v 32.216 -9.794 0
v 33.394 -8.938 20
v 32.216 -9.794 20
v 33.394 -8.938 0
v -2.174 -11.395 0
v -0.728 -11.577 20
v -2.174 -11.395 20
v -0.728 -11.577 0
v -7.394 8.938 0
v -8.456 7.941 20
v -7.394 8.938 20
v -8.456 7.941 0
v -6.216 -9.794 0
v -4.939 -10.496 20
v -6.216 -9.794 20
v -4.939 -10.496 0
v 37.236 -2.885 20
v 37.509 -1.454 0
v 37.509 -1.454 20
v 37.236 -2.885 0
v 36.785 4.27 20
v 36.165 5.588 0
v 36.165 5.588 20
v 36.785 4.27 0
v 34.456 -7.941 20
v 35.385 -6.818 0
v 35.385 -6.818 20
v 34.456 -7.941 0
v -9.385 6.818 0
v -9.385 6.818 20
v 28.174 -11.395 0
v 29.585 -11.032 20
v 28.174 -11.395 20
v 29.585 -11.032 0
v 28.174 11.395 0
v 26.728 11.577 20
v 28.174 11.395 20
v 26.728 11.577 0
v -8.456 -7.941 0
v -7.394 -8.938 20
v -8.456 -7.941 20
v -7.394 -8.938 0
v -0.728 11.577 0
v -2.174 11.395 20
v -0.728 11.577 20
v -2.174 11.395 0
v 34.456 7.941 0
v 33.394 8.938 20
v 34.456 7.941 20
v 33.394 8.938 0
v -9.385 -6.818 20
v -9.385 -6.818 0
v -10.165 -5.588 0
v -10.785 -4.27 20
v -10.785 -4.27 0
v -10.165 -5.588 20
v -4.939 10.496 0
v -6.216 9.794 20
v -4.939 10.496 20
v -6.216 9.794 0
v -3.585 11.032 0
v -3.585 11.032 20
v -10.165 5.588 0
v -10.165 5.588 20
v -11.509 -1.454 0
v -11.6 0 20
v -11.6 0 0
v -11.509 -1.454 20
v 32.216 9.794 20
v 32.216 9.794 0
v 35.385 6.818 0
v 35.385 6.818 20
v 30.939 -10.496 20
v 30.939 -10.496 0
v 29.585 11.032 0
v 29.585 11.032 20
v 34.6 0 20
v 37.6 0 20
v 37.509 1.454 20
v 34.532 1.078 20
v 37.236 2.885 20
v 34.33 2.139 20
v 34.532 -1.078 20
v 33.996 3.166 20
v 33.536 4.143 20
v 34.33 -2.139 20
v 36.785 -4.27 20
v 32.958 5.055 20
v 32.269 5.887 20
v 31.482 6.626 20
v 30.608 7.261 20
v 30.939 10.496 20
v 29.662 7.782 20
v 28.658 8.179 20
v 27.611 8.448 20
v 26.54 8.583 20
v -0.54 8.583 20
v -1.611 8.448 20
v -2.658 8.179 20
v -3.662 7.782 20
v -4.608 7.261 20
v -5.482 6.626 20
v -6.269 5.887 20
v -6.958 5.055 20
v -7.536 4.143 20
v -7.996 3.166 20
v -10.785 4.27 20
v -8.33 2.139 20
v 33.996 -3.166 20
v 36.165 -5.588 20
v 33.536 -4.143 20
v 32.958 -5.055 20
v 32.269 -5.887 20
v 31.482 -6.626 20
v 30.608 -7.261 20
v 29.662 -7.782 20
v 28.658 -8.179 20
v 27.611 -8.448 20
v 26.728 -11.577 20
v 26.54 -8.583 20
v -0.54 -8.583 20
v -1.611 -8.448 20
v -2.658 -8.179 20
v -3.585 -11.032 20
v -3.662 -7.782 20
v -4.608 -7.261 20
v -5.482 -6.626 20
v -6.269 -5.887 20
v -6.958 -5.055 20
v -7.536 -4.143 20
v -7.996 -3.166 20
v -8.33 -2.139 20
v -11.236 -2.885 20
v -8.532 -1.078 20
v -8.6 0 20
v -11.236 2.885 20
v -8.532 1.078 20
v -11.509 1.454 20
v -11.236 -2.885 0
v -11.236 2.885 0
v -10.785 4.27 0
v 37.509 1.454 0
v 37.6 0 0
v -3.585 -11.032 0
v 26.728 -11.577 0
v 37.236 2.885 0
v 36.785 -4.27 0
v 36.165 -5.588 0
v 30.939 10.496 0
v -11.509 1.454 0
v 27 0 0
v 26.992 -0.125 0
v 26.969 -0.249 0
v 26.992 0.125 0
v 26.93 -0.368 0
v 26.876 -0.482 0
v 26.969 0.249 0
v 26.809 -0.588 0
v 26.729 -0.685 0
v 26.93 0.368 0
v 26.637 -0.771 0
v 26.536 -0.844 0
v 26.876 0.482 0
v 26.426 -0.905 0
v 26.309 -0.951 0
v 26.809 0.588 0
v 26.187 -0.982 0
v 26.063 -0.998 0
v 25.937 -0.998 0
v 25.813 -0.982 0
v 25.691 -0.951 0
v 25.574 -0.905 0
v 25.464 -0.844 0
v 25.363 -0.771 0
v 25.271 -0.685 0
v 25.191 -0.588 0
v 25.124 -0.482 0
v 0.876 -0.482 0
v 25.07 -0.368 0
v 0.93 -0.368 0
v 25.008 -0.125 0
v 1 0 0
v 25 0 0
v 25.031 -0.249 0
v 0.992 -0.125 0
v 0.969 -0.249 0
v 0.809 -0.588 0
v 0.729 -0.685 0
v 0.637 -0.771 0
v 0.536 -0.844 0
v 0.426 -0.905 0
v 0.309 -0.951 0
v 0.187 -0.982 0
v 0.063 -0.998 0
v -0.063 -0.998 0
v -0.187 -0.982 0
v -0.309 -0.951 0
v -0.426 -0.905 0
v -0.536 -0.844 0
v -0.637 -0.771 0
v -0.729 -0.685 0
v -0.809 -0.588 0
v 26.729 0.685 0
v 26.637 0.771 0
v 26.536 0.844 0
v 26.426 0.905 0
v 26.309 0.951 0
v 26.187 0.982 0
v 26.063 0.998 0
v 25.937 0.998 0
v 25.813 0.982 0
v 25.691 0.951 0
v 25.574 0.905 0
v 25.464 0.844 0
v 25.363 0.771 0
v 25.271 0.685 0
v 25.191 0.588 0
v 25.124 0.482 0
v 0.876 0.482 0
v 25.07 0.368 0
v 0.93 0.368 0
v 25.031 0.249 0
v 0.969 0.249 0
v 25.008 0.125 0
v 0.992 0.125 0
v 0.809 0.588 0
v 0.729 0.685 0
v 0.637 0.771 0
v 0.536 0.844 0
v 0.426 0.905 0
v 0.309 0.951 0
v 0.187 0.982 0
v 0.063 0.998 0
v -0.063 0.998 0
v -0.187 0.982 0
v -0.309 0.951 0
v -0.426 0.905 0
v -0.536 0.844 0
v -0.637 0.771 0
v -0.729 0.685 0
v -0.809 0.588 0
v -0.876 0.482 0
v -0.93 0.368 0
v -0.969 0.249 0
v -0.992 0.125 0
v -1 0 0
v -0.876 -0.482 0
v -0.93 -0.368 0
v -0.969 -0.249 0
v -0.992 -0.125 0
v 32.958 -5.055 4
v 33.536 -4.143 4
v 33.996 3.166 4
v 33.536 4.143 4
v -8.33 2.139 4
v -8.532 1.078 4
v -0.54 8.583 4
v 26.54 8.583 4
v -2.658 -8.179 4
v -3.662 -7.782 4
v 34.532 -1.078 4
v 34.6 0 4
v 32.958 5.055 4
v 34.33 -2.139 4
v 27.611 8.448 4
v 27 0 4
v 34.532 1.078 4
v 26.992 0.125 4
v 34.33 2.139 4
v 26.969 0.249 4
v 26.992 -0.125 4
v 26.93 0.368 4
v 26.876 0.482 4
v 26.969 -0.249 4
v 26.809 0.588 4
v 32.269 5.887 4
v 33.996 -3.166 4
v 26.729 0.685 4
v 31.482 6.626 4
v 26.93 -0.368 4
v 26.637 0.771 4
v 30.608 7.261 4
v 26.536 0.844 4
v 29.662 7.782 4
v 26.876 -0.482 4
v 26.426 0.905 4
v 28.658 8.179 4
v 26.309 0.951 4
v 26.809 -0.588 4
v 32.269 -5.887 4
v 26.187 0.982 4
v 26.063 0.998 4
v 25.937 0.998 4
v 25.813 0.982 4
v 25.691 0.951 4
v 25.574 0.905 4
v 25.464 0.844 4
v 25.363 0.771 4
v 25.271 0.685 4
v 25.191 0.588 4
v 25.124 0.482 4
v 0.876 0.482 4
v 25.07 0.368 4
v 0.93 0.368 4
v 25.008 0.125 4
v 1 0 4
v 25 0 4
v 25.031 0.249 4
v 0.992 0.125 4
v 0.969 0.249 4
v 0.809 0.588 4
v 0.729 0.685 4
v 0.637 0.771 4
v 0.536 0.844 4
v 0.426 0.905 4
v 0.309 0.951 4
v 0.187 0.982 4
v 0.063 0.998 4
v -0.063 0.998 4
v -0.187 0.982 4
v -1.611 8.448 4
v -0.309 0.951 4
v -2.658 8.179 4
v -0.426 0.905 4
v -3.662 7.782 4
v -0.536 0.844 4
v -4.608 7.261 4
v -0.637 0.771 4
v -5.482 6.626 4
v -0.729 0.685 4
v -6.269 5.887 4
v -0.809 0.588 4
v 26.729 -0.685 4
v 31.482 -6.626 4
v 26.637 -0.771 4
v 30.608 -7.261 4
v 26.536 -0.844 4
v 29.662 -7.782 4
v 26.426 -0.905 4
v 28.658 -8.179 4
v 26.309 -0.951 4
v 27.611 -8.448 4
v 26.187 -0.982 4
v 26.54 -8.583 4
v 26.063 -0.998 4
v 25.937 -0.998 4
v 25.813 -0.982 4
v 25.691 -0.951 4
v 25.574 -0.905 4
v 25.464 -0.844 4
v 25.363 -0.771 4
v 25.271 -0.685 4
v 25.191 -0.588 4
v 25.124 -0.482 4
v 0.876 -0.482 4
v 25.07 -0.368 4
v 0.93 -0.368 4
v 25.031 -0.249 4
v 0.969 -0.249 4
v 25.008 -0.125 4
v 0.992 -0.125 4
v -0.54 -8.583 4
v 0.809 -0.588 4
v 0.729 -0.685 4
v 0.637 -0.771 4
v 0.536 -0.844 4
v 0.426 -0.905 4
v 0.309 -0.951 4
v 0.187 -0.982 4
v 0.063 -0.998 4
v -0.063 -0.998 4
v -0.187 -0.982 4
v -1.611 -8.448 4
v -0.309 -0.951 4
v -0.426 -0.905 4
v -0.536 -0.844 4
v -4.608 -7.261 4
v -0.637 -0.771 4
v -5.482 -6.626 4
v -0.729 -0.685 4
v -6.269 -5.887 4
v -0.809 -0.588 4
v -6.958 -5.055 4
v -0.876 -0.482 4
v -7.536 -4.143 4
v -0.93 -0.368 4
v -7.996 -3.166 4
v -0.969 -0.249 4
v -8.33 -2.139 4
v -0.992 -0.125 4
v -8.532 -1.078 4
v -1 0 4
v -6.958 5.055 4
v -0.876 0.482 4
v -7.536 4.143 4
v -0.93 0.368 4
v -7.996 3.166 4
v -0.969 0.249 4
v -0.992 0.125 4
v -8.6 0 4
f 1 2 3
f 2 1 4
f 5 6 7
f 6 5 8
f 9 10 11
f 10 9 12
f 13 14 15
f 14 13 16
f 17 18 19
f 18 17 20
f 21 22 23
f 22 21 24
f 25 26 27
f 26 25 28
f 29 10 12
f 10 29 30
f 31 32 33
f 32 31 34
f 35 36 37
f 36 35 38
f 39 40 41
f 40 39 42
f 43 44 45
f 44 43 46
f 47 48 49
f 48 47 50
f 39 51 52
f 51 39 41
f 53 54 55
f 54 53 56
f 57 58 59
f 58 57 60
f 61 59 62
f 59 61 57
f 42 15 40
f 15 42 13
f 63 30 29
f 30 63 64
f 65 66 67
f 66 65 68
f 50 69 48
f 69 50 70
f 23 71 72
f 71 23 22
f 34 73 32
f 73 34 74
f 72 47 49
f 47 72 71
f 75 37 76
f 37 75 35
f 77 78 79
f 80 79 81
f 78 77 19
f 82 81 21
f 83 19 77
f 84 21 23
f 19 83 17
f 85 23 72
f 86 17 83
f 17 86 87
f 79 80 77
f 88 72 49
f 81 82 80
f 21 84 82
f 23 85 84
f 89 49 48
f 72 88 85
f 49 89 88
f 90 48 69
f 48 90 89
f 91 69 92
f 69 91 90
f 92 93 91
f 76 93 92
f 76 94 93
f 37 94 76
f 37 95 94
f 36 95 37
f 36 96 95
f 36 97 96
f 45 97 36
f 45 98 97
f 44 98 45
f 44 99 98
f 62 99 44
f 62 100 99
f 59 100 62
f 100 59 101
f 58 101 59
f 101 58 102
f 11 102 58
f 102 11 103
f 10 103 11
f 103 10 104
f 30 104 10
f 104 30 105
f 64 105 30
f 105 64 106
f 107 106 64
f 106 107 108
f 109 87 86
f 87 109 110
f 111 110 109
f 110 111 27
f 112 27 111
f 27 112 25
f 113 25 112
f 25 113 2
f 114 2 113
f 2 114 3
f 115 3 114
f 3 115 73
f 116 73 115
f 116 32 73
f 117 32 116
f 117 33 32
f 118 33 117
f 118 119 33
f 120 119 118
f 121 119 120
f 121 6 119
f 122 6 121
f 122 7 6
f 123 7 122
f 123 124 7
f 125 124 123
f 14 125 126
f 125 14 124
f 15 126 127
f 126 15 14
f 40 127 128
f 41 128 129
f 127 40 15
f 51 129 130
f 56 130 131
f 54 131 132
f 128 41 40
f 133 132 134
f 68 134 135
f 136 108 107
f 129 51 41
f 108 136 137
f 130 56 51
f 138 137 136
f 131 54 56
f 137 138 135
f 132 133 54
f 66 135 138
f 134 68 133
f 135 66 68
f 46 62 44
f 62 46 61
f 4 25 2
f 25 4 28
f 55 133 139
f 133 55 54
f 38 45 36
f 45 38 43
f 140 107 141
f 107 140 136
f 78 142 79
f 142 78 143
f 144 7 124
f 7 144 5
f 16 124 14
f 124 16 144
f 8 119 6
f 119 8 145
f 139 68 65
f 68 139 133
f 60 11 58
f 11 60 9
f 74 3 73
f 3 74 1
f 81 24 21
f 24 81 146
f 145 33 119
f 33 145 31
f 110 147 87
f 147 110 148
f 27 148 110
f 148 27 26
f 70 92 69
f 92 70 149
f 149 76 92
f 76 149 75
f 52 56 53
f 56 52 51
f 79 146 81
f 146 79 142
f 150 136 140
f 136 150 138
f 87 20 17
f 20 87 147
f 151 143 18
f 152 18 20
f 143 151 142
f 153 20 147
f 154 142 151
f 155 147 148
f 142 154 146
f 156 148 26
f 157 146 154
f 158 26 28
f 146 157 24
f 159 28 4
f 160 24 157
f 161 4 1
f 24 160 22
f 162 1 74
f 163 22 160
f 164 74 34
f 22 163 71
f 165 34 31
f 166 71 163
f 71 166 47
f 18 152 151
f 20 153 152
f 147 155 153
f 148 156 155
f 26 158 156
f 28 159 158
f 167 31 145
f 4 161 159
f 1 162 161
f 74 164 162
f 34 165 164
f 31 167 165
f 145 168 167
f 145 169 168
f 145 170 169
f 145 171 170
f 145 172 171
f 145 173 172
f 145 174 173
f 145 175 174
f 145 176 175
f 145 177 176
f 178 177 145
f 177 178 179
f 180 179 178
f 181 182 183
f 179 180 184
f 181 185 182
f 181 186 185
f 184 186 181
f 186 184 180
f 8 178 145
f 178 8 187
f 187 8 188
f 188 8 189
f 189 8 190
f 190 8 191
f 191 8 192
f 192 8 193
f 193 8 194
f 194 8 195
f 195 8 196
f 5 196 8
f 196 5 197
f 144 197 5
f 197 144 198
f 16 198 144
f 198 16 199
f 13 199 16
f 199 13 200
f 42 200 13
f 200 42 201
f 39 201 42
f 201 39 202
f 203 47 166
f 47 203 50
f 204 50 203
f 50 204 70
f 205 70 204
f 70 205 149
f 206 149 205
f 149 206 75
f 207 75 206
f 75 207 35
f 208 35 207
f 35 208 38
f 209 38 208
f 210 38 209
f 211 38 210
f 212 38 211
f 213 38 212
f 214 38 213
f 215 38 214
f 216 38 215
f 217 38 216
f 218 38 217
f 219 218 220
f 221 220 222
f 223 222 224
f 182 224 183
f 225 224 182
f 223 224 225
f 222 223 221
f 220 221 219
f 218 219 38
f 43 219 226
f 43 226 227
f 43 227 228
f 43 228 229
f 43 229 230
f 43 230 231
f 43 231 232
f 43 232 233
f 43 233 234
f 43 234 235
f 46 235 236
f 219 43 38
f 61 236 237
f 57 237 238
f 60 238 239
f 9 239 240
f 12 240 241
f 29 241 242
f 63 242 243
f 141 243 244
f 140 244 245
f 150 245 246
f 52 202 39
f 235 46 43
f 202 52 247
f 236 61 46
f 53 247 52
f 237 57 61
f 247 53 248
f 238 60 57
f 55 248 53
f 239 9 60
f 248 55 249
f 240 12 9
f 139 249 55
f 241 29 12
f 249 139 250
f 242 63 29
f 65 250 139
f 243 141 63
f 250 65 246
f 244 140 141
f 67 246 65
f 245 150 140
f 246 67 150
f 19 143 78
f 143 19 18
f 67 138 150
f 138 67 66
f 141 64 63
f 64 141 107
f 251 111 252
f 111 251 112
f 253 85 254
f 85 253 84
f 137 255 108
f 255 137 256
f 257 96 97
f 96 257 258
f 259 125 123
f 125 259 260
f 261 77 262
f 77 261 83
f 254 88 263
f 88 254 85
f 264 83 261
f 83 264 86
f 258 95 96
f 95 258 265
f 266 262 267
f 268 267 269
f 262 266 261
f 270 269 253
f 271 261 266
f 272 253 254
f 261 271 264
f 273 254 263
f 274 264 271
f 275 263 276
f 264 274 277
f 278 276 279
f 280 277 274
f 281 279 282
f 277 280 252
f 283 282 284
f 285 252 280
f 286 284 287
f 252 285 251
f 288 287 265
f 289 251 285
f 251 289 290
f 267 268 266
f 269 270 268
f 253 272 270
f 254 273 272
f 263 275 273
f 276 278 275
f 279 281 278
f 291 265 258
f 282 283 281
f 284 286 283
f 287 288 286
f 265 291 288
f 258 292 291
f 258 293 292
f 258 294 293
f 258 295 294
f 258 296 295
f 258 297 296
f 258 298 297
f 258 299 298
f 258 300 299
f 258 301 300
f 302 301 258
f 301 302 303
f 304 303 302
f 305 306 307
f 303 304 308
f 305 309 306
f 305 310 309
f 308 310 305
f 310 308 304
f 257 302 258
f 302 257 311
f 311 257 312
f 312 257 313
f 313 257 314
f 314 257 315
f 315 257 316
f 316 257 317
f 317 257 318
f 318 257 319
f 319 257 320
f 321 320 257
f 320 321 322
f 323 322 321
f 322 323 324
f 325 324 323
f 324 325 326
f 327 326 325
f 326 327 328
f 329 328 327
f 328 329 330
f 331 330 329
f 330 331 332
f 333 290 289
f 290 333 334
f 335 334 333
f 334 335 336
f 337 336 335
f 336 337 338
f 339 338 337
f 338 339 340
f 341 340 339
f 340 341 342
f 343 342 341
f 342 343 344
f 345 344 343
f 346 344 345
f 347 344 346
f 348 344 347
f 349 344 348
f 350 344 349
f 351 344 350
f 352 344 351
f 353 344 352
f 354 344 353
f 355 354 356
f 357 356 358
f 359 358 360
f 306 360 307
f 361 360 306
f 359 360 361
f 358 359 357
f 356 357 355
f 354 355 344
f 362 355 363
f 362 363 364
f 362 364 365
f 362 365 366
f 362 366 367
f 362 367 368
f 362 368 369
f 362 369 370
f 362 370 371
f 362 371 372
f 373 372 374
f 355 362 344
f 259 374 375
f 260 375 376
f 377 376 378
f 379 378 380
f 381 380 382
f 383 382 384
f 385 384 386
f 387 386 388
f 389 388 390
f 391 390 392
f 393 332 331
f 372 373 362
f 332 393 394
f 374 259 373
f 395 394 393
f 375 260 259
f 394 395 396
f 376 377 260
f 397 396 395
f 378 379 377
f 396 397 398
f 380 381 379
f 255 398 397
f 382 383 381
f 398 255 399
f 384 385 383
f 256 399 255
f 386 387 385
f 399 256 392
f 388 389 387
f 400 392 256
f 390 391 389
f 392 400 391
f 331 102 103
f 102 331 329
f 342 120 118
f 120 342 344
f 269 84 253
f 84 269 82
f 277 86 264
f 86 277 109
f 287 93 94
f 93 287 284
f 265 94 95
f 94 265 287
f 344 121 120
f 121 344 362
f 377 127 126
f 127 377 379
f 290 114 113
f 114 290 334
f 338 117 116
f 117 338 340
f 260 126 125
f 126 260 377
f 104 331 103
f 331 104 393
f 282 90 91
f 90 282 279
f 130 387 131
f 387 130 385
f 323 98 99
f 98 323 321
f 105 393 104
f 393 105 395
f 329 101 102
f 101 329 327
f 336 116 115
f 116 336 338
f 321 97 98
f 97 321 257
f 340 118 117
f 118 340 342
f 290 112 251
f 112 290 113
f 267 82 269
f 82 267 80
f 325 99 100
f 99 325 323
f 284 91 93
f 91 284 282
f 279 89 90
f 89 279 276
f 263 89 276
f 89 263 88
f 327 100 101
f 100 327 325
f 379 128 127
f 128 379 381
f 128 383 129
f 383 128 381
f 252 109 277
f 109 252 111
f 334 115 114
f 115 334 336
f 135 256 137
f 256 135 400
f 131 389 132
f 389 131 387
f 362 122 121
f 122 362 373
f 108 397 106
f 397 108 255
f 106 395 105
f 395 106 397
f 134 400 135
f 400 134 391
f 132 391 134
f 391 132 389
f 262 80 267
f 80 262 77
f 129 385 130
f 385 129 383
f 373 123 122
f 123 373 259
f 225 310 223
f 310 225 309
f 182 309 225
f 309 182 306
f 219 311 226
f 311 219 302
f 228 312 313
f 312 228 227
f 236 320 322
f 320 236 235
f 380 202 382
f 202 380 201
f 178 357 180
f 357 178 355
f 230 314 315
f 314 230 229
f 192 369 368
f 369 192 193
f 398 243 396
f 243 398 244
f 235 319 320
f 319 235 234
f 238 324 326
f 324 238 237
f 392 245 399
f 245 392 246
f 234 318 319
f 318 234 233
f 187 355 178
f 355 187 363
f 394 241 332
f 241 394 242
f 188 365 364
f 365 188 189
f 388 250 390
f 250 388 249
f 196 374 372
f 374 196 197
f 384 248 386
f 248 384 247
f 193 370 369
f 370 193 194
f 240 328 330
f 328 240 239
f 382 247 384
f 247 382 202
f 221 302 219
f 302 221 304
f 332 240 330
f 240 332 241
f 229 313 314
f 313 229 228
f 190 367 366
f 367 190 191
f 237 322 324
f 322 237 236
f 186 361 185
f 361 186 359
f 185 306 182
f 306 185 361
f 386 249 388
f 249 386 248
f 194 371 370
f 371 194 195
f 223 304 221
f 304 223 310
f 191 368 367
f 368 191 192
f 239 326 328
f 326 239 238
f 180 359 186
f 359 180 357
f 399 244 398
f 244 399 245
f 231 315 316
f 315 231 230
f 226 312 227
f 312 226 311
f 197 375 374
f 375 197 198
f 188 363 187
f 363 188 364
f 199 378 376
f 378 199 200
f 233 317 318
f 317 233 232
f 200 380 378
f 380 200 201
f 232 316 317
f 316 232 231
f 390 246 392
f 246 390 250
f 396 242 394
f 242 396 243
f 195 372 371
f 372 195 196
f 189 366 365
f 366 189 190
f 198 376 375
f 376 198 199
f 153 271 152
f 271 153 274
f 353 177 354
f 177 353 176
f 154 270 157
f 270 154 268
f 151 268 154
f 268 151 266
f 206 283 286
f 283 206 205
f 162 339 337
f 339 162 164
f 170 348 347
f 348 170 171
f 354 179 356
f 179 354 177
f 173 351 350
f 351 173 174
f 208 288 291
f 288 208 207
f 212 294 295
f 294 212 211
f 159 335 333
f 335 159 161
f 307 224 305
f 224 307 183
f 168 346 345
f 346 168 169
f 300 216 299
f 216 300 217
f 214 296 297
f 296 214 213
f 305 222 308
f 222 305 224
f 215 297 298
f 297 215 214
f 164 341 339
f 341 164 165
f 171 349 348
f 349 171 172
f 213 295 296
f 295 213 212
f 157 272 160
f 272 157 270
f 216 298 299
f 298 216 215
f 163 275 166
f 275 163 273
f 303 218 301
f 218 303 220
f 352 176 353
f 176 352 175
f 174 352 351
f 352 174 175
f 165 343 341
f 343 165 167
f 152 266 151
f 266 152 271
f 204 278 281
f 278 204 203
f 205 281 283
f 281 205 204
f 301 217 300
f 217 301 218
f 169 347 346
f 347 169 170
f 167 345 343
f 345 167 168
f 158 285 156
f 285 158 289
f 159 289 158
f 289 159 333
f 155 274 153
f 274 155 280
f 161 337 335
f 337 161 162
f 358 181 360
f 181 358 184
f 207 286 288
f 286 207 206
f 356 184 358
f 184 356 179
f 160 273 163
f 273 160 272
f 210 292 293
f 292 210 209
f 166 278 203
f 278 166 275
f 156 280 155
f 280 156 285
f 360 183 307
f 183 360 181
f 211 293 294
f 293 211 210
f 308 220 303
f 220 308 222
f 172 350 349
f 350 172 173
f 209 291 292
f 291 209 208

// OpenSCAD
//Bumper height
height=20;

//Wall
wall=3;

//Ground
ground_thickness=4;

//chair thickness
chair_thickness=17.2;

//chair width
chair_width=43.2;


/*hidden*/
$fn=50;

difference() {
        
//aussen
	hull() {
	cylinder(h=height,d=chair_thickness+wall*2);
		translate([chair_width-chair_thickness,0,0]) 
			cylinder(h=height,d=chair_thickness+wall*2);
	}


//innen
	hull() {
	translate([0,0,ground_thickness]) 
	cylinder(h=height,d=chair_thickness);
		translate([chair_width-chair_thickness,0,ground_thickness]) 
			cylinder(h=height,d=chair_thickness);


	}
			cylinder(h=height,d=2);
			translate([chair_width-chair_thickness,0,0]) 
				cylinder(h=height,d=2);






}
